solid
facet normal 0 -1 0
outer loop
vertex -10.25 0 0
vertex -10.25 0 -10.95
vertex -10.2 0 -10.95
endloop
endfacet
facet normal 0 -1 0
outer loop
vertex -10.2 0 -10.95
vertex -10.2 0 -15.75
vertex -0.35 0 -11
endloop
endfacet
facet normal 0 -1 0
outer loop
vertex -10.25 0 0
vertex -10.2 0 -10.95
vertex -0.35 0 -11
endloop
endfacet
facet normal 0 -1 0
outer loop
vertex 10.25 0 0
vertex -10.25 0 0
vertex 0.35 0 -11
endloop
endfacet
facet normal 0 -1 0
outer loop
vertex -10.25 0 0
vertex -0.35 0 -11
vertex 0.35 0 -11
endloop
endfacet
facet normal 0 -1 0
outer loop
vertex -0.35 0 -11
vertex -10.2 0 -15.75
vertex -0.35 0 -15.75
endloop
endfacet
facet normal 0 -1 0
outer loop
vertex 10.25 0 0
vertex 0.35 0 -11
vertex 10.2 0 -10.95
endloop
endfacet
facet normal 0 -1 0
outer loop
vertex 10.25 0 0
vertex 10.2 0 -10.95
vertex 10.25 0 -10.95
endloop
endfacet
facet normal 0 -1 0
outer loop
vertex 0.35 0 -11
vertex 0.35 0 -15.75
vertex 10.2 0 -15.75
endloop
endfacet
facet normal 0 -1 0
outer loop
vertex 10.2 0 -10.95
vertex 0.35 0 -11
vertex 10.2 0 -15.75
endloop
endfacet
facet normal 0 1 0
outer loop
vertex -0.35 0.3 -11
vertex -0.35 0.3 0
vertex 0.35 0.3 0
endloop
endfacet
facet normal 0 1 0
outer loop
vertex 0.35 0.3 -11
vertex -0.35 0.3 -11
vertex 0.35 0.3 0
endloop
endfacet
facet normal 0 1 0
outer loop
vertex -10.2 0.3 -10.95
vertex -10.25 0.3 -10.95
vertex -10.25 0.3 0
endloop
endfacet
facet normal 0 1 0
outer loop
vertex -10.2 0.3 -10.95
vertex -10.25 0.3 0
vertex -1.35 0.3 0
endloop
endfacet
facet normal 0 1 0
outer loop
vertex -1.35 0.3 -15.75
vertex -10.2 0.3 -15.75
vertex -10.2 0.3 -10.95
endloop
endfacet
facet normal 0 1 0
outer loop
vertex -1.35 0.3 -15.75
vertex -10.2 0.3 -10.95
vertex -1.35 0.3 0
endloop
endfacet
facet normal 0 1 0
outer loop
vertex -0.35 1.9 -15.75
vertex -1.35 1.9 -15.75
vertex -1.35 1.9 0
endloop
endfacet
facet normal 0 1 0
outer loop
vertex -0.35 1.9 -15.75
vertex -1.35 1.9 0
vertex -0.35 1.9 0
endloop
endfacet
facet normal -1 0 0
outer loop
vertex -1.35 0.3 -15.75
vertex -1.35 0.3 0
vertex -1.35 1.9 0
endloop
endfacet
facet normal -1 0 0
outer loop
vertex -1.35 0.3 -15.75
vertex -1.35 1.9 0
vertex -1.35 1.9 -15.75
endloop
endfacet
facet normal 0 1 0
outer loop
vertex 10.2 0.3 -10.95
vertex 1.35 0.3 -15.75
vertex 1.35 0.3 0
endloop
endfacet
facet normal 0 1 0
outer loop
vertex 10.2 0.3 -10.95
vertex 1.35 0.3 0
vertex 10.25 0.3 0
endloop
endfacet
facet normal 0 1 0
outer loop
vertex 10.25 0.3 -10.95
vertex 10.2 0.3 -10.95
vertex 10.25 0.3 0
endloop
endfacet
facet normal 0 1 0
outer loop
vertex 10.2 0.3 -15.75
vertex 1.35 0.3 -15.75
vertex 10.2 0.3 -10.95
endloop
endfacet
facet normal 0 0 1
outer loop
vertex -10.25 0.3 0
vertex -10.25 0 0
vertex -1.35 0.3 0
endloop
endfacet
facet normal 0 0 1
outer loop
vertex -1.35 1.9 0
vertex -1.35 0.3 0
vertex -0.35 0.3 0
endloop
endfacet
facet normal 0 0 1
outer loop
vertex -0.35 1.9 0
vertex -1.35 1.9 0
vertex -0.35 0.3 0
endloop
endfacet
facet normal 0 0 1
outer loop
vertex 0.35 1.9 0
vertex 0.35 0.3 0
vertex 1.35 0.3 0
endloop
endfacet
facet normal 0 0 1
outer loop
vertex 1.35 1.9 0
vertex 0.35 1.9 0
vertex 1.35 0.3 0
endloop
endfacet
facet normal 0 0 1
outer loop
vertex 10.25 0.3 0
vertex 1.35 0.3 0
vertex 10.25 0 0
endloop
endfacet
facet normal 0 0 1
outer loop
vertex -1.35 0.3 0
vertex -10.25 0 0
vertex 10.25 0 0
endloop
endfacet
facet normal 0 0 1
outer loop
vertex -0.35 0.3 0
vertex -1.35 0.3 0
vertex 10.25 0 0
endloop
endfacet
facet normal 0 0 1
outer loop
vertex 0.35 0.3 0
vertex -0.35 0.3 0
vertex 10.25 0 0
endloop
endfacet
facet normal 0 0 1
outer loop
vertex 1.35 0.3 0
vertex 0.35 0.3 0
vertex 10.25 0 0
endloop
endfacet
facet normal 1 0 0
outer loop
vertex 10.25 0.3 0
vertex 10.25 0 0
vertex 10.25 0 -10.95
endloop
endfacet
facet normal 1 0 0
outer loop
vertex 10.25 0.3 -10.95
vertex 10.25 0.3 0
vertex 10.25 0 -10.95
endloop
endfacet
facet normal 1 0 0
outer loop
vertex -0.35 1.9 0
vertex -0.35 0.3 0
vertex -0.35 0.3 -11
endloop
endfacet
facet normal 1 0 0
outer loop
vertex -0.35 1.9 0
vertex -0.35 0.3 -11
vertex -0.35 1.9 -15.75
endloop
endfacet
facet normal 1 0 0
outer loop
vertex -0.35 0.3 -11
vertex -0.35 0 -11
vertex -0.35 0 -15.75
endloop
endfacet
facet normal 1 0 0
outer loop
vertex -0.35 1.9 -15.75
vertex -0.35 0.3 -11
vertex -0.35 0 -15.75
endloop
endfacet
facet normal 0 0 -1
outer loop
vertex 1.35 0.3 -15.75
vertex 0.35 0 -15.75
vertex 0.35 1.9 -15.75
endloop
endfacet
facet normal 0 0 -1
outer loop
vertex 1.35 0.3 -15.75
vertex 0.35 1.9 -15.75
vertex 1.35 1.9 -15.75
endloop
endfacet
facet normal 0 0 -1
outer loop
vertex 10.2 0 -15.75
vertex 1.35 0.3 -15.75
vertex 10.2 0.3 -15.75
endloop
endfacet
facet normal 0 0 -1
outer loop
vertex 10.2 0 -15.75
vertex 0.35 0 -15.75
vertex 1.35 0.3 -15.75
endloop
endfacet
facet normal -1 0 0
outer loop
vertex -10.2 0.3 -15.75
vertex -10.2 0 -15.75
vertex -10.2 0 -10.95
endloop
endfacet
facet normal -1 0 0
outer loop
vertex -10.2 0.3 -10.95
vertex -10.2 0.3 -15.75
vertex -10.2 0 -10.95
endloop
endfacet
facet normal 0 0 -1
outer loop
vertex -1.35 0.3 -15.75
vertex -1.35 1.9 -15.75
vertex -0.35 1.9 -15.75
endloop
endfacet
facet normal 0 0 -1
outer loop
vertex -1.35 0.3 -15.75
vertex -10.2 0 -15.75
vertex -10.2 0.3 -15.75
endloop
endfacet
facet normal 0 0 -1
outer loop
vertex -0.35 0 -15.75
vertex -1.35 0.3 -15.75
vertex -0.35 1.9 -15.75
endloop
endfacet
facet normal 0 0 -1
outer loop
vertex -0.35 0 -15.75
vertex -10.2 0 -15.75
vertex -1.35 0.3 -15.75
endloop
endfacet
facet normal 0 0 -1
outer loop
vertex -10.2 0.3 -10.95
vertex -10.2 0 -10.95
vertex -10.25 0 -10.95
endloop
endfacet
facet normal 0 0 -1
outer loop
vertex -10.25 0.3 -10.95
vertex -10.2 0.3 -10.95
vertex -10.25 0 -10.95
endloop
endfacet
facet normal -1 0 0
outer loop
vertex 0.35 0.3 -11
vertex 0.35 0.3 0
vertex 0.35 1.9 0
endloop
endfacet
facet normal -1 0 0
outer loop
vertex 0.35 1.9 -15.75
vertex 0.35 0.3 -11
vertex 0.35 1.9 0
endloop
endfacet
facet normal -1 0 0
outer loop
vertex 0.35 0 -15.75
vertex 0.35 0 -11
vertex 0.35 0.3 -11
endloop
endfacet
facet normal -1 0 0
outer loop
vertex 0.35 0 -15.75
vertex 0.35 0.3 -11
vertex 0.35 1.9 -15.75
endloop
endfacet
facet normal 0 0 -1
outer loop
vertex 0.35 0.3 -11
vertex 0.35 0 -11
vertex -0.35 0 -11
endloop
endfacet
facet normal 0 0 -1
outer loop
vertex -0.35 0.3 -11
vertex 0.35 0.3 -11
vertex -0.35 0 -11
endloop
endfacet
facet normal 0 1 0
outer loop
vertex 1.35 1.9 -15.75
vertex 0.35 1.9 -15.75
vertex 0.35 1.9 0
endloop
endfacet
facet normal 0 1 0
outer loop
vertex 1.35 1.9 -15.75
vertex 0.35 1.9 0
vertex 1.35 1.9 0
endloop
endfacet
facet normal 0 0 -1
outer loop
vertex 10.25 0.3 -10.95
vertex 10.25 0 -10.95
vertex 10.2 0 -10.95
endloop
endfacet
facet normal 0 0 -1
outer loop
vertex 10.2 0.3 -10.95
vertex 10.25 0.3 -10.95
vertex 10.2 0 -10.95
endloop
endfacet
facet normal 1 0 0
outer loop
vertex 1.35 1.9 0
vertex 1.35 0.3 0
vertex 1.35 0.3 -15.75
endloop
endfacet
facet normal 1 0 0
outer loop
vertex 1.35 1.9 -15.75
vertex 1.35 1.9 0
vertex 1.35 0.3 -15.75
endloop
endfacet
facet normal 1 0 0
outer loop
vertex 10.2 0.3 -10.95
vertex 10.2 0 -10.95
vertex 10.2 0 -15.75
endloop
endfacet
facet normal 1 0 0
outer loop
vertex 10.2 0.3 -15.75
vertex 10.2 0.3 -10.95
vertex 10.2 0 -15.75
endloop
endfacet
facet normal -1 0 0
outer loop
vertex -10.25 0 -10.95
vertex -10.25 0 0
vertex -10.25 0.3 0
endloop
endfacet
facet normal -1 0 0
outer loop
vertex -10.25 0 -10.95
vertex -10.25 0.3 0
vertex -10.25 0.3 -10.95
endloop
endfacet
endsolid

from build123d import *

# Parameters (mm, degrees)
BOSS_EXTRUDE1_DEPTH = 0.3
SKETCH2_W           = 1
SKETCH2_H           = 15.75
BOSS_EXTRUDE2_DEPTH = 1.6
SKETCH1_3_W         = 0.25
SKETCH1_3_H         = 10.95
CUT_EXTRUDE2_DEPTH  = 10


with BuildPart() as part:
    # Sketch1 → Boss-Extrude1 (new body)
    with BuildSketch(Plane(origin=(0, 0, 0), x_dir=(1, 0, 0), z_dir=(0, 1, 0))):
        Polygon((-10.5, 10.95), (-10.5, 0), (10.5, 0), (10.5, 10.95), (10.2, 10.95), (10.2, 15.75), (0.35, 15.75), (0.35, 11), (-0.35, 11), (-0.35, 15.75), (-10.2, 15.75), (-10.2, 10.95), align=None)
    extrude(amount=BOSS_EXTRUDE1_DEPTH)

    # Sketch2 → Boss-Extrude2 (add)
    with BuildSketch(Plane(origin=(0, 0.3, 0), x_dir=(1, 0, 0), z_dir=(0, 1, 0))):
        with Locations((-0.85, 7.875)):
            Rectangle(SKETCH2_W, SKETCH2_H)
        with Locations((0.85, 7.875)):
            Rectangle(SKETCH2_W, SKETCH2_H)
    extrude(amount=BOSS_EXTRUDE2_DEPTH)

    # Sketch1<3> → Cut-Extrude2 (cut)
    with BuildSketch(Plane(origin=(0, 0, 0), x_dir=(1, 0, 0), z_dir=(0, 1, 0))):
        with Locations((-10.375, 5.475)):
            Rectangle(SKETCH1_3_W, SKETCH1_3_H)
        with Locations((10.375, 5.475)):
            Rectangle(SKETCH1_3_W, SKETCH1_3_H)
    extrude(amount=CUT_EXTRUDE2_DEPTH, mode=Mode.SUBTRACT)


solid = part.part
